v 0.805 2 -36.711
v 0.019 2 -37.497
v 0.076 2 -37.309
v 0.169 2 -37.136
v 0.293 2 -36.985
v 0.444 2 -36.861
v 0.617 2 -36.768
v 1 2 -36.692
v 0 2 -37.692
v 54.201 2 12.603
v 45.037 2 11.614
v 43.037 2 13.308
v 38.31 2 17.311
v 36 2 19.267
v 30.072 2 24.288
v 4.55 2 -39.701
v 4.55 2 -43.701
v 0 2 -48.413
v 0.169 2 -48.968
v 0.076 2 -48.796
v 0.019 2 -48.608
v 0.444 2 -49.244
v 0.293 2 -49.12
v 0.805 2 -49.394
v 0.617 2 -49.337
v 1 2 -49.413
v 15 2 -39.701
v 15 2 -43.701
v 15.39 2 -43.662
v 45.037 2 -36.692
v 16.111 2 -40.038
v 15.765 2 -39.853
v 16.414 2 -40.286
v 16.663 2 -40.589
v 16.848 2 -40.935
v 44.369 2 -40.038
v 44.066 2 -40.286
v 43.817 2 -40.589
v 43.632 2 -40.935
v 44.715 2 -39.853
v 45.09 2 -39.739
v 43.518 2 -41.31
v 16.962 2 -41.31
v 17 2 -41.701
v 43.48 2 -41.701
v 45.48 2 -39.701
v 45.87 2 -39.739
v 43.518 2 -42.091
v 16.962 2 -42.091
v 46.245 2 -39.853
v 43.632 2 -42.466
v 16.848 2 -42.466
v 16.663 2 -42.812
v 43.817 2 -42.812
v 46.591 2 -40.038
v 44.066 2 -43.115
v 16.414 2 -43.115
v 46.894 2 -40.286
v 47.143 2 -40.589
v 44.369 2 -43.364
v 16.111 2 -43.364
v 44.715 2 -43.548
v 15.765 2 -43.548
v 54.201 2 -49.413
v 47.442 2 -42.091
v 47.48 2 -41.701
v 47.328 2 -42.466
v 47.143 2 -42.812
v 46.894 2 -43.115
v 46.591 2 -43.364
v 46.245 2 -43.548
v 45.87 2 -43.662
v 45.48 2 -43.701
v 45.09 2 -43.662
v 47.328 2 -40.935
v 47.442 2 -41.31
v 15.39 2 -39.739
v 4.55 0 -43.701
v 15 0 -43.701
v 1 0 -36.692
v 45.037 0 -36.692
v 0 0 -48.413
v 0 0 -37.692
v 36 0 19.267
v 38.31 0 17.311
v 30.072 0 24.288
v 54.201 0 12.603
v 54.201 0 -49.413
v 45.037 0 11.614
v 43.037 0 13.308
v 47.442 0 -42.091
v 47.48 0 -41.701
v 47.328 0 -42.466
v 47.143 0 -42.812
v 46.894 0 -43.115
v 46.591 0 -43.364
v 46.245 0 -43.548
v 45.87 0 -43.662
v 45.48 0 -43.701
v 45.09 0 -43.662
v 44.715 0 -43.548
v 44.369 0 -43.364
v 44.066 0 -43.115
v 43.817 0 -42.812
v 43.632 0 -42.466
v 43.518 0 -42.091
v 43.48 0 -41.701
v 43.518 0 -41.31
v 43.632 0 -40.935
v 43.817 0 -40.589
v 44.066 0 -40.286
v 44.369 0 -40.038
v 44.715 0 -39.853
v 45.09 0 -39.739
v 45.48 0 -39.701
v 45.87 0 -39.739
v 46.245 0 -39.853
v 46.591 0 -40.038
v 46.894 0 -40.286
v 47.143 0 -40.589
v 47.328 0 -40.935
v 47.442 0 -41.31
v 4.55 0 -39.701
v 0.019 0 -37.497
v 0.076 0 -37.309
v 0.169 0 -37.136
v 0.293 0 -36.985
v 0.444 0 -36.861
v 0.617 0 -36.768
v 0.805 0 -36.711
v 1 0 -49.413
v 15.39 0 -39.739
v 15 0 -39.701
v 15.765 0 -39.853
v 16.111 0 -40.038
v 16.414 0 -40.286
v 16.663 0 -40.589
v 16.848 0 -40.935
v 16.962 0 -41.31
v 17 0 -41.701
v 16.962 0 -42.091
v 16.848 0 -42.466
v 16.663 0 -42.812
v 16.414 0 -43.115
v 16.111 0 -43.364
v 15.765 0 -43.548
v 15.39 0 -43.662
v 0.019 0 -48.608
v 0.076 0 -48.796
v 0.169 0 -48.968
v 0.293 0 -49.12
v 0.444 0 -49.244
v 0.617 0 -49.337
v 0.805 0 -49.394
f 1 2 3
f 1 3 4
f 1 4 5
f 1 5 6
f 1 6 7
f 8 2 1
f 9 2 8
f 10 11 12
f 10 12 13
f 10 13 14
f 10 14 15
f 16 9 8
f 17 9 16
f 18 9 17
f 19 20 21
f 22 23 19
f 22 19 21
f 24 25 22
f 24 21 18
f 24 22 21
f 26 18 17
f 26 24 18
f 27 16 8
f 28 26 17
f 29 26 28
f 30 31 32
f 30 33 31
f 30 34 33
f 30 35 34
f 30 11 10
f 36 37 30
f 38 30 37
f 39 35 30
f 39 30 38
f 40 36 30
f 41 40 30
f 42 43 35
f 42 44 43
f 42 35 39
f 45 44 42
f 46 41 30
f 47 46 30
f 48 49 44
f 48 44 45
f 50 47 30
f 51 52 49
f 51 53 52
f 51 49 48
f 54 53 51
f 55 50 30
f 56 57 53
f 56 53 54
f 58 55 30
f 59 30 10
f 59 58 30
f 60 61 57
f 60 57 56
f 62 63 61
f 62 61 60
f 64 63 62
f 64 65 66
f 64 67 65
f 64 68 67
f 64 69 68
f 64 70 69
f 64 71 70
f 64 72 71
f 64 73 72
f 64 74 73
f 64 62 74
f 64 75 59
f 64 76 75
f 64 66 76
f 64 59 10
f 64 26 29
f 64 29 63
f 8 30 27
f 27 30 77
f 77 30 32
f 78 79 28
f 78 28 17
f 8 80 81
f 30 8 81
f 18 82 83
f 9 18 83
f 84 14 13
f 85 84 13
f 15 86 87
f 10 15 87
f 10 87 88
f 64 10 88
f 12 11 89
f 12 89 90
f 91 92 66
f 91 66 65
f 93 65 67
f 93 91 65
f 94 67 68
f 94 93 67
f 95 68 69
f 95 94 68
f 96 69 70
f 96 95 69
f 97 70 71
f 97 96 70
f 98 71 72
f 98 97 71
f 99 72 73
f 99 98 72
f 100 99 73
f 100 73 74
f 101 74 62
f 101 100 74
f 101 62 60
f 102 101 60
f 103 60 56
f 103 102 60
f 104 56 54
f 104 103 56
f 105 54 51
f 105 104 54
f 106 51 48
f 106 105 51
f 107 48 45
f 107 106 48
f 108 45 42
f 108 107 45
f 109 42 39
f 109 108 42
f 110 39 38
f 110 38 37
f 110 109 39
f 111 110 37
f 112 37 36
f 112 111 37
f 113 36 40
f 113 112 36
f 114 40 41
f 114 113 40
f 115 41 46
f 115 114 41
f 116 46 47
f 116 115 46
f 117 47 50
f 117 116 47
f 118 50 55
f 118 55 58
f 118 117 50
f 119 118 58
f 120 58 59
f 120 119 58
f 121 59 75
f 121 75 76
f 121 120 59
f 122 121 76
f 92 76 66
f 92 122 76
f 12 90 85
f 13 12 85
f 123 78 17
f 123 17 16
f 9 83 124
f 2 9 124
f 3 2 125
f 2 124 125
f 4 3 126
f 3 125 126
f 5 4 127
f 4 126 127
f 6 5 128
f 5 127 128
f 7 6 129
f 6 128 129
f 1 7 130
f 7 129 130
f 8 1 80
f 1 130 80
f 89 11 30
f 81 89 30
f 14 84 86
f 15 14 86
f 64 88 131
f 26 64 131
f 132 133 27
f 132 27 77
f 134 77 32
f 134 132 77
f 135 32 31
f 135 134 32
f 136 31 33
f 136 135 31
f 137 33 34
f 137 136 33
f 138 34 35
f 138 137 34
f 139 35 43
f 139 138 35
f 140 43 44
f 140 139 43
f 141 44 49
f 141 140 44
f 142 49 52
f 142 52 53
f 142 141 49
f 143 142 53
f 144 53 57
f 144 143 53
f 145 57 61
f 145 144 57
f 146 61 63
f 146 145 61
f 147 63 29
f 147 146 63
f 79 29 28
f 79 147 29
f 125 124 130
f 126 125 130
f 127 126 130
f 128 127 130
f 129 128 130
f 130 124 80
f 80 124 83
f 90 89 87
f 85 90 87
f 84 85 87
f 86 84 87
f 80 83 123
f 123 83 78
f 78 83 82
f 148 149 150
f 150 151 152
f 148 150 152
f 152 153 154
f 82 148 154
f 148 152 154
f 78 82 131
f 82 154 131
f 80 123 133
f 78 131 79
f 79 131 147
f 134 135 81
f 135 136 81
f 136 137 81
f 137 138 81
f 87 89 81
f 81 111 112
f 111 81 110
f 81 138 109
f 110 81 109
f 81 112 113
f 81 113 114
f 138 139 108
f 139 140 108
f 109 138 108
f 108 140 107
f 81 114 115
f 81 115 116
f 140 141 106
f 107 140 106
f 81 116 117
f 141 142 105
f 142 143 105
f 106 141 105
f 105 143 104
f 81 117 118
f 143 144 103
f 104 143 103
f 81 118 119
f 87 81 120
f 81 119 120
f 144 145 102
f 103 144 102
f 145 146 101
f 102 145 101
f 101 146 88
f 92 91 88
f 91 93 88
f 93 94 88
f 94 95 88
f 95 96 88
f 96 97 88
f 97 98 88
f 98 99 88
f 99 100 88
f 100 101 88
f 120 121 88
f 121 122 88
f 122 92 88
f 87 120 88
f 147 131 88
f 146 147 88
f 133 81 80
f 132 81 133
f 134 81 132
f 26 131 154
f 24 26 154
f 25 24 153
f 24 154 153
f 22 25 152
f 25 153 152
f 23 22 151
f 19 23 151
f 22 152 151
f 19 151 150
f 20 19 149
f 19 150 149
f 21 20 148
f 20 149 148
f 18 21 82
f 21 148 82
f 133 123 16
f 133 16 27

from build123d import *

# Parameters (mm, degrees)
SKETCH1_R           = 2
BOSS_EXTRUDE2_DEPTH = 2
CUT_EXTRUDE2_DEPTH  = 9
CUT_EXTRUDE3_DEPTH  = 9


with BuildPart() as part:
    # Sketch1 → Boss-Extrude2 (new body)
    with BuildSketch(Plane(origin=(0, 0, 0), x_dir=(1, 0, 0), z_dir=(0, 1, 0))):
        with BuildLine():
            Line((0, 48.412862342), (0, 37.692030173))
            ThreePointArc((0, 37.692030173), (0.292893219, 36.984923392), (1, 36.692030173))
            Line((1, 36.692030173), (31.48, 36.692030173))
            Line((31.48, 36.692030173), (43.036527631, 36.692030173))
            Line((43.036527631, 36.692030173), (43.036527631, -13.307969827))
            Line((43.036527631, -13.307969827), (38.310297741, -17.310739702))
            Line((38.310297741, -17.310739702), (34.253582629, -17.310739702))
            Line((34.253582629, -17.310739702), (36, -19.267392345))
            Line((36, -19.267392345), (30.071702425, -24.288225334))
            Line((30.071702425, -24.288225334), (54.200832168, -12.602889922))
            Line((54.200832168, -12.602889922), (54.200832168, 10.267562985))
            Line((54.200832168, 10.267562985), (54.200832168, 49.412862342))
            Line((54.200832168, 49.412862342), (41.48, 49.412862342))
            Line((41.48, 49.412862342), (1, 49.412862342))
            ThreePointArc((1, 49.412862342), (0.292893219, 49.119969123), (0, 48.412862342))
        make_face()
        with Locations((45.48, 41.700609081)):
            Circle(SKETCH1_R, mode=Mode.SUBTRACT)
        with BuildLine():
            Line((15, 43.700609081), (4.549516448, 43.700609081))
            Line((4.549516448, 43.700609081), (4.549516448, 39.700609081))
            Line((4.549516448, 39.700609081), (15, 39.700609081))
            ThreePointArc((15, 39.700609081), (17, 41.700609081), (15, 43.700609081))
        make_face(mode=Mode.SUBTRACT)
    extrude(amount=BOSS_EXTRUDE2_DEPTH)

    # Sketch6 → Cut-Extrude2 (cut)
    with BuildSketch(Plane(origin=(0, 2, 0), x_dir=(1, 0, 0), z_dir=(0, 1, 0))):
        Polygon((36, -19.267392345), (38.310297741, -17.310739702), (34.253582629, -17.310739702), align=None)
    extrude(amount=-CUT_EXTRUDE2_DEPTH, mode=Mode.SUBTRACT)

    # Sketch8 → Cut-Extrude3 (cut)
    with BuildSketch(Plane(origin=(0, 2, 0), x_dir=(1, 0, 0), z_dir=(0, 1, 0))):
        Polygon((43.036527631, 36.692030173), (45.036527631, 36.692030173), (45.036527631, -11.115496155), (45.036527631, -11.614116599), (43.036527631, -13.307969827), align=None)
    extrude(amount=-CUT_EXTRUDE3_DEPTH, mode=Mode.SUBTRACT)


solid = part.part
